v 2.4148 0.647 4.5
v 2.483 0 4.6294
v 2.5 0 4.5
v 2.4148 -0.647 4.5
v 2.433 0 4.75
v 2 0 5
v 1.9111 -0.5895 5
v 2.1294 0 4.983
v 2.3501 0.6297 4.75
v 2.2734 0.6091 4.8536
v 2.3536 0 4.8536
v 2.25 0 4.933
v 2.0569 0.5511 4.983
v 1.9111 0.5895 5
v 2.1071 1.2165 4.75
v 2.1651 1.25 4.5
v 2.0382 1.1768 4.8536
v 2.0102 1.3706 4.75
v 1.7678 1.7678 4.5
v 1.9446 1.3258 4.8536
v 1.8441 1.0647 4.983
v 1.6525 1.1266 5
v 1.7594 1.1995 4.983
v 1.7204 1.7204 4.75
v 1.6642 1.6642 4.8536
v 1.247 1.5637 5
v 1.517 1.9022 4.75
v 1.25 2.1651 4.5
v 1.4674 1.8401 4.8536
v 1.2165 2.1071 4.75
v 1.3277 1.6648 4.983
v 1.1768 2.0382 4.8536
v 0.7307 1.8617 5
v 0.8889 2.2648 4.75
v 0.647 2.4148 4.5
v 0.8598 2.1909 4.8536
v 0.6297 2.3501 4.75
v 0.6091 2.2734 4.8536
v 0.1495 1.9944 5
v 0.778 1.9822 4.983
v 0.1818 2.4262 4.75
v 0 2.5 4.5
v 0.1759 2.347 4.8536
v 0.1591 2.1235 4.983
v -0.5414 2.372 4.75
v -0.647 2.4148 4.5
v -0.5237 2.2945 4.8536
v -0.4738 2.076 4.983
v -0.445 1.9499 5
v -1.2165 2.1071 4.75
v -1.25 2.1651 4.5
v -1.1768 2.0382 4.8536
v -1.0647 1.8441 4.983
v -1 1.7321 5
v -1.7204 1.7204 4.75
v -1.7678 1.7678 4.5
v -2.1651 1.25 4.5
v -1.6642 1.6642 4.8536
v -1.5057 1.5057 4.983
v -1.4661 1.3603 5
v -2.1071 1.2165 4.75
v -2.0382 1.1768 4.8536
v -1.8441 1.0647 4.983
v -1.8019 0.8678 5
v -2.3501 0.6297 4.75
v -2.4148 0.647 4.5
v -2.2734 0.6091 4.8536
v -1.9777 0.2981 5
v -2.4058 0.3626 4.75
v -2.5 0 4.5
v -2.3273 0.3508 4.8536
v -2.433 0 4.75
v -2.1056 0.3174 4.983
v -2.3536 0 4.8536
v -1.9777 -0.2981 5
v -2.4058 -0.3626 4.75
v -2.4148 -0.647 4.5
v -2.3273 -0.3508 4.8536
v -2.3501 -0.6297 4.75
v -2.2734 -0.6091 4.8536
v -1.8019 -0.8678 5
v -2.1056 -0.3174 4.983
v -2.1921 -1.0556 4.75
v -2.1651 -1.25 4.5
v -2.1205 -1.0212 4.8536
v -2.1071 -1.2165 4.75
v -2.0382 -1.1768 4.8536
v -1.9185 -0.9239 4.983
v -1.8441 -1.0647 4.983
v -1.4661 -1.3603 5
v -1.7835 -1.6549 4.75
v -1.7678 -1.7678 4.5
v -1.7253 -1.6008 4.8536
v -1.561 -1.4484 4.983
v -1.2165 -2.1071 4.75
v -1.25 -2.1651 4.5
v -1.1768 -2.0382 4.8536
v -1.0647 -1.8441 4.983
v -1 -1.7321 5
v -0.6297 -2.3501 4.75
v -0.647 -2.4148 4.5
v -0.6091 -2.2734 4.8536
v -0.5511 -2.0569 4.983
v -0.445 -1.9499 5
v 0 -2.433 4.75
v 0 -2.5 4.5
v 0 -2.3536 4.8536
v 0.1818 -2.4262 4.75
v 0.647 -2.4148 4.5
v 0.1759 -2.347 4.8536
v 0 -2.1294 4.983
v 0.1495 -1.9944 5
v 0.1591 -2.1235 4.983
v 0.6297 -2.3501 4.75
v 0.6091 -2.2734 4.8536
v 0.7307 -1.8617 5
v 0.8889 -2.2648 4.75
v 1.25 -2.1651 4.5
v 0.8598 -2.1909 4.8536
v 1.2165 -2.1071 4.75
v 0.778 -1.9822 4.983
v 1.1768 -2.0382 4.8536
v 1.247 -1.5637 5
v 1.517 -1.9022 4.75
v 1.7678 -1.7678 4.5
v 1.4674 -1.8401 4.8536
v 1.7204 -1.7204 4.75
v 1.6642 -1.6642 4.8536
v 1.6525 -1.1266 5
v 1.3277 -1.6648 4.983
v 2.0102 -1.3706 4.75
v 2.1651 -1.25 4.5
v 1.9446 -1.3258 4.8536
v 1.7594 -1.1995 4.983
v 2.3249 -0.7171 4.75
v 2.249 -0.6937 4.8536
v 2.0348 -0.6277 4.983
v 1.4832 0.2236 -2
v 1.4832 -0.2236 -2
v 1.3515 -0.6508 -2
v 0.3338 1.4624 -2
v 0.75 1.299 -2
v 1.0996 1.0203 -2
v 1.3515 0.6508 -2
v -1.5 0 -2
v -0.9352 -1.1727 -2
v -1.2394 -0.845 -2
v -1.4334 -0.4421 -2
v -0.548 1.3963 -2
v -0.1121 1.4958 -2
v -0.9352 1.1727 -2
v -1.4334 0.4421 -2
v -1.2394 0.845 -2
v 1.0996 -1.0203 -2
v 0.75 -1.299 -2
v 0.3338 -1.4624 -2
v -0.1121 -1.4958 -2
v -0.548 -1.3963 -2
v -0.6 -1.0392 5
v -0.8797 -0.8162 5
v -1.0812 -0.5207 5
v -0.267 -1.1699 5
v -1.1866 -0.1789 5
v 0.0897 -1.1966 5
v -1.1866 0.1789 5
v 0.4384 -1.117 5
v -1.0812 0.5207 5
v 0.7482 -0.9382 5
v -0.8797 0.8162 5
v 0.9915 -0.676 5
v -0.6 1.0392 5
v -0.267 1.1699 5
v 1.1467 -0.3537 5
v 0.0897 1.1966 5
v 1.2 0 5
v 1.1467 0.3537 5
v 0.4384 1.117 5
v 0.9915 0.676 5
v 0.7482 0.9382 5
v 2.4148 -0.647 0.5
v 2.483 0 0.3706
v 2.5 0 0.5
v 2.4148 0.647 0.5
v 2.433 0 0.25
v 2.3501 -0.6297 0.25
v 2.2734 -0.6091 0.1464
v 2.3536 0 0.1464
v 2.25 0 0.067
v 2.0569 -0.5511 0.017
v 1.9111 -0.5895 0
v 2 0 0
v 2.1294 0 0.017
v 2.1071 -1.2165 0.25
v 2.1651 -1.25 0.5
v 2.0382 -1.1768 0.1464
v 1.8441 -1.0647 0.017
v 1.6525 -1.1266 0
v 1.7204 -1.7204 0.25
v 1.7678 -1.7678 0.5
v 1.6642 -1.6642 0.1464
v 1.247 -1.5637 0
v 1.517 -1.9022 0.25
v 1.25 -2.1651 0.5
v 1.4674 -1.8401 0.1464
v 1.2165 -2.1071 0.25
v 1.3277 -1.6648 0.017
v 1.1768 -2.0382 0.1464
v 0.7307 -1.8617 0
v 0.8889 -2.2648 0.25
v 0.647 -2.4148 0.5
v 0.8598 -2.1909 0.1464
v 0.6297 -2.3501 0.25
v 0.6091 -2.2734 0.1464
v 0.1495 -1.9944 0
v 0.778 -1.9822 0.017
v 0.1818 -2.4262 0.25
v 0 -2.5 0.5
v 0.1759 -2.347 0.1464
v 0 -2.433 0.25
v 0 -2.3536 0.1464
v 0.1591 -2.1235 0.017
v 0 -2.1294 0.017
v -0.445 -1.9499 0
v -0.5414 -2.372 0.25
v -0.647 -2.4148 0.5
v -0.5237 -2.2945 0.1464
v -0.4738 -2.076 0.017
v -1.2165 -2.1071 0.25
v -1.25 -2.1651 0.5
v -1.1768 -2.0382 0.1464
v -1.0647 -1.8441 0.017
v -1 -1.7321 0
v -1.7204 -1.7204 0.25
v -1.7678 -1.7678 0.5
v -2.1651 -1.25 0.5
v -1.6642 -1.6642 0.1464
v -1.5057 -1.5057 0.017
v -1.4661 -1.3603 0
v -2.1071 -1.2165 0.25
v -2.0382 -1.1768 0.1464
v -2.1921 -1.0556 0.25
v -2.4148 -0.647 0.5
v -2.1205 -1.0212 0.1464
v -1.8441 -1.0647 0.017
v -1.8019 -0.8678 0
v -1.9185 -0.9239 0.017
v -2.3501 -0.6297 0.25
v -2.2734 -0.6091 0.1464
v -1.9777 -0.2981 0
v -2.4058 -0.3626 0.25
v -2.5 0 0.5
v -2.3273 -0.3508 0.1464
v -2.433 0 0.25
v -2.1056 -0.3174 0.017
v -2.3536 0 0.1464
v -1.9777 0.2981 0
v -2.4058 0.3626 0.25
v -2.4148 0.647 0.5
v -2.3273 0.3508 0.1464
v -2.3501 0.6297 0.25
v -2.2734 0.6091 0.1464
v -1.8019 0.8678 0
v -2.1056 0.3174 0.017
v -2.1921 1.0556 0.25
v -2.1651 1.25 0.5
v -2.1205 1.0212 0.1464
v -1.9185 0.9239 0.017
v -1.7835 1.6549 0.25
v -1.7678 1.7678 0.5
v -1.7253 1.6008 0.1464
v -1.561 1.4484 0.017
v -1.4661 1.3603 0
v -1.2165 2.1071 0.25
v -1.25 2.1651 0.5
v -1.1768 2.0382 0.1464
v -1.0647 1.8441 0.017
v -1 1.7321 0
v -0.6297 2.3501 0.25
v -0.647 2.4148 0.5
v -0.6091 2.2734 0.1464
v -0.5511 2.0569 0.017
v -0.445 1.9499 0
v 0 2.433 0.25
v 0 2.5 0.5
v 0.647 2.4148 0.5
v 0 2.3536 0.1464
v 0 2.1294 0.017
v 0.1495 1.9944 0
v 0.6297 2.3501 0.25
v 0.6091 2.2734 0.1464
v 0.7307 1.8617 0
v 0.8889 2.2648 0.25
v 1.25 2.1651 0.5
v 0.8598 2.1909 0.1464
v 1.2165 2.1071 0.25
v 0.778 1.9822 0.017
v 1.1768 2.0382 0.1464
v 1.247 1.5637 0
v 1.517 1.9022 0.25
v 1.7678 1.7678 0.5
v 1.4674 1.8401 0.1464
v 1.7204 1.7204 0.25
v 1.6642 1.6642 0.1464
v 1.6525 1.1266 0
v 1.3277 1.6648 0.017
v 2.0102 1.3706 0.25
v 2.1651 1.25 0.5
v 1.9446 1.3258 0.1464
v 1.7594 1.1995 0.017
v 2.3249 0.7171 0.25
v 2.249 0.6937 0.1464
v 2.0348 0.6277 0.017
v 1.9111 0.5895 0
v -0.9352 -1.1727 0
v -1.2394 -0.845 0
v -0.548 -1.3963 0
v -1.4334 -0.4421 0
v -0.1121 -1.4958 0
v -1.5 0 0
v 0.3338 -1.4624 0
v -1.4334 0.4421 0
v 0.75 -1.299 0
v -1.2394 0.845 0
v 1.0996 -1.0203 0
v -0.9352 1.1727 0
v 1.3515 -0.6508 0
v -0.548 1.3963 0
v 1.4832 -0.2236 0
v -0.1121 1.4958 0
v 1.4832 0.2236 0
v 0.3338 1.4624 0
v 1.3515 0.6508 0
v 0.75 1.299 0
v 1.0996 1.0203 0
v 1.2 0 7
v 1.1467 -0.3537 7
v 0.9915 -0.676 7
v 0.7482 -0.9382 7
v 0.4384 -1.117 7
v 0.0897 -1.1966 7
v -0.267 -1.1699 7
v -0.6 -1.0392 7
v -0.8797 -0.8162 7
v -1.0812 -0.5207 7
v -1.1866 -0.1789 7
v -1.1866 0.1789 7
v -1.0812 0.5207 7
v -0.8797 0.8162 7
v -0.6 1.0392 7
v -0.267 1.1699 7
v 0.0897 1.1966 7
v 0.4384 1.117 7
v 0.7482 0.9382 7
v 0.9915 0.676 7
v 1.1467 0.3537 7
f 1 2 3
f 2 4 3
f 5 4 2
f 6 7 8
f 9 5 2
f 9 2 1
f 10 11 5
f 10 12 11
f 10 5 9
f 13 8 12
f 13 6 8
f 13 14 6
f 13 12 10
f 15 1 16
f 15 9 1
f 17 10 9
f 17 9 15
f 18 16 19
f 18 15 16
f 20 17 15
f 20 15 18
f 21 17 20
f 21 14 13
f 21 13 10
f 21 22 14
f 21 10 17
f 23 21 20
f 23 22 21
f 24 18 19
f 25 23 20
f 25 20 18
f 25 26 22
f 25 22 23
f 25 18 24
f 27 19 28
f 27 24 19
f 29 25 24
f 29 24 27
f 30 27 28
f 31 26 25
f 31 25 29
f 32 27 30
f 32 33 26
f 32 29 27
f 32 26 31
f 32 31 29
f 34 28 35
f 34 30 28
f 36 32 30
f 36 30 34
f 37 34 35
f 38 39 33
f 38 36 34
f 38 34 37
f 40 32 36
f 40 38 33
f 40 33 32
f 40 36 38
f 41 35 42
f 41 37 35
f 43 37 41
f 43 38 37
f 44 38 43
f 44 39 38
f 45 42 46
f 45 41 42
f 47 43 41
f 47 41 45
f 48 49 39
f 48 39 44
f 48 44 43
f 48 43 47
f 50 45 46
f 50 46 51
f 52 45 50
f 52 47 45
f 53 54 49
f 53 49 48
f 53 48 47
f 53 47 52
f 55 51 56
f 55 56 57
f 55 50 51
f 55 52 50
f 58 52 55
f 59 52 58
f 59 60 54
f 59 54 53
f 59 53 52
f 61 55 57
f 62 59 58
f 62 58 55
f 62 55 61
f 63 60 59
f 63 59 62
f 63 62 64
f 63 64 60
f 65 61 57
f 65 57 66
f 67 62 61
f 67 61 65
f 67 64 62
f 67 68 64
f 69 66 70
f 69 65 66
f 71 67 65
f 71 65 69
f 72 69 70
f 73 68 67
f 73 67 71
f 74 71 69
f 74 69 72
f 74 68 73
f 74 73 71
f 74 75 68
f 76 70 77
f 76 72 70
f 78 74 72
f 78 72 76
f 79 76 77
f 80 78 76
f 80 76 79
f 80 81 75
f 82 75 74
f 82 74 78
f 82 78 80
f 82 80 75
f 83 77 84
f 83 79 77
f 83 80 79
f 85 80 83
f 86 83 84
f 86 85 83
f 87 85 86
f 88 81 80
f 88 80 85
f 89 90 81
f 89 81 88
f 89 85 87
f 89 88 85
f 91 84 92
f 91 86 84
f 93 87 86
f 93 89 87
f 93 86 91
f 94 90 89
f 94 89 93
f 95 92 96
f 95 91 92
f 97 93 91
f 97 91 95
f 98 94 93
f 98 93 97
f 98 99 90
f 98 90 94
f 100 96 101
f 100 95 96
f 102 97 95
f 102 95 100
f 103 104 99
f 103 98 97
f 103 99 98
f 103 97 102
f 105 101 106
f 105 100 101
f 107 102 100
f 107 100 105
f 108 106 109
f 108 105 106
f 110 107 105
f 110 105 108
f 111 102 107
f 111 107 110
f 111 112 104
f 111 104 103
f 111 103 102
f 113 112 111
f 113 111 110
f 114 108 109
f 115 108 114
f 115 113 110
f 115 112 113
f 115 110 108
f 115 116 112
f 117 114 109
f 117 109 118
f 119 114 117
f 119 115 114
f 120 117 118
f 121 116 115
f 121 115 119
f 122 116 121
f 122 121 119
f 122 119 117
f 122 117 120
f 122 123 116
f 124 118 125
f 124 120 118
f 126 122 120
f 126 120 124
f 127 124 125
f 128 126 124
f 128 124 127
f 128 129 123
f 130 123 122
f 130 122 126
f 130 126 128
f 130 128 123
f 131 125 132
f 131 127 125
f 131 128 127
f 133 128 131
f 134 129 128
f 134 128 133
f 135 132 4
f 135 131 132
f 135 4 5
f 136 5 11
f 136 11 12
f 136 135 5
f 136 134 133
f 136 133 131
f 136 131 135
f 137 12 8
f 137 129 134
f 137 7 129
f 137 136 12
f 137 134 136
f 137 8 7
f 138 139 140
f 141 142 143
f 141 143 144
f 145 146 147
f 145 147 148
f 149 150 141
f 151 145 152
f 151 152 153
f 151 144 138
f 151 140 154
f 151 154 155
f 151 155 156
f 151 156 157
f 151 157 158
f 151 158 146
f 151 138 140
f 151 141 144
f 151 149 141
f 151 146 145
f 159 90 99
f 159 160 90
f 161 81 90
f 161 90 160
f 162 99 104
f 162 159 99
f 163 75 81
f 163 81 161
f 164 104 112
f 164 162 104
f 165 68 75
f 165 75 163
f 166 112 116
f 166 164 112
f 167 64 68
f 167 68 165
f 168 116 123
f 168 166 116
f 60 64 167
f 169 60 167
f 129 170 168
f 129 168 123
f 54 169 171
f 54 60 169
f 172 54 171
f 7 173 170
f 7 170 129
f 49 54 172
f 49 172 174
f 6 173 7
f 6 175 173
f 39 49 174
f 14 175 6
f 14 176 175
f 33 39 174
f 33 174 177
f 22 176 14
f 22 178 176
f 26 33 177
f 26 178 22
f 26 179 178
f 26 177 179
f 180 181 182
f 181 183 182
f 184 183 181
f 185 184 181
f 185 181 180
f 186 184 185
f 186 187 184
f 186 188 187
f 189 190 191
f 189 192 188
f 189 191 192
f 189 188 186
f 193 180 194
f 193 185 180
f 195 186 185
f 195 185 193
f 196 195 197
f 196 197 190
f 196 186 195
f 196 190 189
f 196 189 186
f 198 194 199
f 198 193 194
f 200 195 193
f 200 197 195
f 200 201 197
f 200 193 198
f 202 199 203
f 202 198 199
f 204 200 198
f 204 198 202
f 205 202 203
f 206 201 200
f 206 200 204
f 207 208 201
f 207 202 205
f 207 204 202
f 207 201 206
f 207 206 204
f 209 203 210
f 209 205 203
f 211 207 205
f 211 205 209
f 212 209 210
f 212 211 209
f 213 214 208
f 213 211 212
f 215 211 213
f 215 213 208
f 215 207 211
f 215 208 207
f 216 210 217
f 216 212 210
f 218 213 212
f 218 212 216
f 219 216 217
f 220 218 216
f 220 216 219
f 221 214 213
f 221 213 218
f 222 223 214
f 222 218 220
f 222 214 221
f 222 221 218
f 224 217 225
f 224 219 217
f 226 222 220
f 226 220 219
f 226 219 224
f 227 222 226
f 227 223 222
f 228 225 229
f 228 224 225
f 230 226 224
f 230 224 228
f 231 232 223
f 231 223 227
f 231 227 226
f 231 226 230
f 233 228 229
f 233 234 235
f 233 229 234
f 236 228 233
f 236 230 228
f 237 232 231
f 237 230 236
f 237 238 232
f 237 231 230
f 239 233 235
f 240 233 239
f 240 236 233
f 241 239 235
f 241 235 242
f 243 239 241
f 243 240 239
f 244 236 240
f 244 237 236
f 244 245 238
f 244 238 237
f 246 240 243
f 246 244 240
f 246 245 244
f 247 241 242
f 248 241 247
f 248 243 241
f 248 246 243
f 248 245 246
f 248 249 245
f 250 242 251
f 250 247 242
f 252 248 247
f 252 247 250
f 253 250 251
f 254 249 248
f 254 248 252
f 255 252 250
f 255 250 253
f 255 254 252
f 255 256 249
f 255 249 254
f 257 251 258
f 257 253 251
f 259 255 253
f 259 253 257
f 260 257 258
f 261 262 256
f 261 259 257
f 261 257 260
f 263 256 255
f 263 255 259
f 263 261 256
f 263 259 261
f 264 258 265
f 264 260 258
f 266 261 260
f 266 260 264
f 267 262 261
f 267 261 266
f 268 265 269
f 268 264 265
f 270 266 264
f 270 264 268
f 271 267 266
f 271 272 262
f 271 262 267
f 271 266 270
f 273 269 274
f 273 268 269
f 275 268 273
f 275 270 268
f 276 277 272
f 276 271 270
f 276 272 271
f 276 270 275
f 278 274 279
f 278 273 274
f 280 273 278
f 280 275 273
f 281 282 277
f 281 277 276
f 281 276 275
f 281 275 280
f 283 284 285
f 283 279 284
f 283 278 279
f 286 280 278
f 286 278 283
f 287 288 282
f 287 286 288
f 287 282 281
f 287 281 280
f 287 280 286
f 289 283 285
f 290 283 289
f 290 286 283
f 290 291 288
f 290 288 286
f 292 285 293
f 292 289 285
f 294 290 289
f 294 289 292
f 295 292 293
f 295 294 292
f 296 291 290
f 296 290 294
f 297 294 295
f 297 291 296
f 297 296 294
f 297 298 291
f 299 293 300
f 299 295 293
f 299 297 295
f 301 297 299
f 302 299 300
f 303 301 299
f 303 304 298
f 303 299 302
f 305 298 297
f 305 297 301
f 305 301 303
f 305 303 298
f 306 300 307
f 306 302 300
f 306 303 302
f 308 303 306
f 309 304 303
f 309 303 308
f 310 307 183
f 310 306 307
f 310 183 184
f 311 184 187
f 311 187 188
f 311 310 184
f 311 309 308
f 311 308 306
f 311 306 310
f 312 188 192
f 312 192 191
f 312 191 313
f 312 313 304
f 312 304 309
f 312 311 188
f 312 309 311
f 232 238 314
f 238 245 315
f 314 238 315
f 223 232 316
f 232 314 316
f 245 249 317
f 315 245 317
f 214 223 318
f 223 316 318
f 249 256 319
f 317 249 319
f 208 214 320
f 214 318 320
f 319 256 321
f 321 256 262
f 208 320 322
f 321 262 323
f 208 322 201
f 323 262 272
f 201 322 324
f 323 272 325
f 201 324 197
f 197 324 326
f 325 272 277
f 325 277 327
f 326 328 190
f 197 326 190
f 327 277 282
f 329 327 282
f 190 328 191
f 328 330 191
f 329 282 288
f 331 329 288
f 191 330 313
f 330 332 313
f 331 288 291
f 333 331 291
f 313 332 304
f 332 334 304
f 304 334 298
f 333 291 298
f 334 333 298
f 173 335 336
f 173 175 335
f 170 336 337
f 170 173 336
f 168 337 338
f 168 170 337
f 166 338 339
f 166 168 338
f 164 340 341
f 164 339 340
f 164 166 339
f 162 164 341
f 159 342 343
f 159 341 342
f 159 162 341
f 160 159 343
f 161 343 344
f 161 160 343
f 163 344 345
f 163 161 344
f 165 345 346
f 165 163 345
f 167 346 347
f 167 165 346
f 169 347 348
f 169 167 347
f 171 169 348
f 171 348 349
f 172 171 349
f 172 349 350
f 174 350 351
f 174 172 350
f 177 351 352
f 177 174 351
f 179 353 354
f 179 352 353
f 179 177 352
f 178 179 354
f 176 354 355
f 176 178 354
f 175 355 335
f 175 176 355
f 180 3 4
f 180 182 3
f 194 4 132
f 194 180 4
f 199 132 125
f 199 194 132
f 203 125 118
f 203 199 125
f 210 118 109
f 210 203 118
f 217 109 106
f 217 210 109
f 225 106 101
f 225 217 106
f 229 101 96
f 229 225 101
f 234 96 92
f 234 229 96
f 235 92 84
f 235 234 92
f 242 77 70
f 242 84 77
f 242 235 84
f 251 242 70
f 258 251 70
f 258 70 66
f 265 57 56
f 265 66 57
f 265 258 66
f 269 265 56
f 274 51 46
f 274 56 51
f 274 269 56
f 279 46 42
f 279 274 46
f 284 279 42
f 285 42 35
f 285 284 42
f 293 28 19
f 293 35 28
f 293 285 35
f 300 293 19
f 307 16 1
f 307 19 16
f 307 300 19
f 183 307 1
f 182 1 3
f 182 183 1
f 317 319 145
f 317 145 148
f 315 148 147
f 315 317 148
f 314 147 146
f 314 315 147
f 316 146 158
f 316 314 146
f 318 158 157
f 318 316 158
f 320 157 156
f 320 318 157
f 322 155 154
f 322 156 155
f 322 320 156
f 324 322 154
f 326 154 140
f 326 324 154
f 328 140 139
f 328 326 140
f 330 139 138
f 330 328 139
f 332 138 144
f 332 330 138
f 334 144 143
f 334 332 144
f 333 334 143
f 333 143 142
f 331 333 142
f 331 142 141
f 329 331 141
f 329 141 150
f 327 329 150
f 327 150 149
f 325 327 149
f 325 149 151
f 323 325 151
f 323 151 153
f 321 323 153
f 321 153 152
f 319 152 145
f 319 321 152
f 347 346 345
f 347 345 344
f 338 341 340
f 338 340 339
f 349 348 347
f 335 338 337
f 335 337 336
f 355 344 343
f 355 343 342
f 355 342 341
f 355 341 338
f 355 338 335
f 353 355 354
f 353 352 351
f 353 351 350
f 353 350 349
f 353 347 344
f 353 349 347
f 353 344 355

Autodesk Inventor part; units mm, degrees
ref_plane "YZ Plane" through (0, 0, 0) normal (1, 0, 0) x (0, 1, 0)
ref_plane "XZ Plane" through (0, 0, 0) normal (0, 1, 0) x (-1, 0, 0)
ref_plane "XY Plane" through (0, 0, 0) normal (0, 0, 1) x (1, 0, 0)
sketch "スケッチ1" plane through (0, 0, 0) normal (0, 0, 1) x (1, 0, 0)
  circle A0 centre (0, 0) radius 2.5
  dimension "d10" = 5
extrude "押し出し1" add sketch "スケッチ1" along normal blind 5
sketch "スケッチ2" plane through (0, 0, 5) normal (0, 0, 1) x (1, 0, 0)
  circle A0 centre (0, 0) radius 1.2
  dimension "d7" = 2.4
extrude "押し出し2" add sketch "スケッチ2" along normal blind 2
fillet "フィレット1" radius 0.5 2 edges at (-2.5, 0, 5) (-2.5, 0, 0)
sketch "スケッチ3" plane through (0, 0, 0) normal (0, 0, -1) x (-1, 0, 0)
  circle A0 centre (0, 0) radius 2 projected
  circle A1 centre (0, 0) radius 1.5
  dimension "d12" = 3
extrude "押し出し3" add sketch "スケッチ3" along normal blind 2 contours A1
properties part number "worka"
